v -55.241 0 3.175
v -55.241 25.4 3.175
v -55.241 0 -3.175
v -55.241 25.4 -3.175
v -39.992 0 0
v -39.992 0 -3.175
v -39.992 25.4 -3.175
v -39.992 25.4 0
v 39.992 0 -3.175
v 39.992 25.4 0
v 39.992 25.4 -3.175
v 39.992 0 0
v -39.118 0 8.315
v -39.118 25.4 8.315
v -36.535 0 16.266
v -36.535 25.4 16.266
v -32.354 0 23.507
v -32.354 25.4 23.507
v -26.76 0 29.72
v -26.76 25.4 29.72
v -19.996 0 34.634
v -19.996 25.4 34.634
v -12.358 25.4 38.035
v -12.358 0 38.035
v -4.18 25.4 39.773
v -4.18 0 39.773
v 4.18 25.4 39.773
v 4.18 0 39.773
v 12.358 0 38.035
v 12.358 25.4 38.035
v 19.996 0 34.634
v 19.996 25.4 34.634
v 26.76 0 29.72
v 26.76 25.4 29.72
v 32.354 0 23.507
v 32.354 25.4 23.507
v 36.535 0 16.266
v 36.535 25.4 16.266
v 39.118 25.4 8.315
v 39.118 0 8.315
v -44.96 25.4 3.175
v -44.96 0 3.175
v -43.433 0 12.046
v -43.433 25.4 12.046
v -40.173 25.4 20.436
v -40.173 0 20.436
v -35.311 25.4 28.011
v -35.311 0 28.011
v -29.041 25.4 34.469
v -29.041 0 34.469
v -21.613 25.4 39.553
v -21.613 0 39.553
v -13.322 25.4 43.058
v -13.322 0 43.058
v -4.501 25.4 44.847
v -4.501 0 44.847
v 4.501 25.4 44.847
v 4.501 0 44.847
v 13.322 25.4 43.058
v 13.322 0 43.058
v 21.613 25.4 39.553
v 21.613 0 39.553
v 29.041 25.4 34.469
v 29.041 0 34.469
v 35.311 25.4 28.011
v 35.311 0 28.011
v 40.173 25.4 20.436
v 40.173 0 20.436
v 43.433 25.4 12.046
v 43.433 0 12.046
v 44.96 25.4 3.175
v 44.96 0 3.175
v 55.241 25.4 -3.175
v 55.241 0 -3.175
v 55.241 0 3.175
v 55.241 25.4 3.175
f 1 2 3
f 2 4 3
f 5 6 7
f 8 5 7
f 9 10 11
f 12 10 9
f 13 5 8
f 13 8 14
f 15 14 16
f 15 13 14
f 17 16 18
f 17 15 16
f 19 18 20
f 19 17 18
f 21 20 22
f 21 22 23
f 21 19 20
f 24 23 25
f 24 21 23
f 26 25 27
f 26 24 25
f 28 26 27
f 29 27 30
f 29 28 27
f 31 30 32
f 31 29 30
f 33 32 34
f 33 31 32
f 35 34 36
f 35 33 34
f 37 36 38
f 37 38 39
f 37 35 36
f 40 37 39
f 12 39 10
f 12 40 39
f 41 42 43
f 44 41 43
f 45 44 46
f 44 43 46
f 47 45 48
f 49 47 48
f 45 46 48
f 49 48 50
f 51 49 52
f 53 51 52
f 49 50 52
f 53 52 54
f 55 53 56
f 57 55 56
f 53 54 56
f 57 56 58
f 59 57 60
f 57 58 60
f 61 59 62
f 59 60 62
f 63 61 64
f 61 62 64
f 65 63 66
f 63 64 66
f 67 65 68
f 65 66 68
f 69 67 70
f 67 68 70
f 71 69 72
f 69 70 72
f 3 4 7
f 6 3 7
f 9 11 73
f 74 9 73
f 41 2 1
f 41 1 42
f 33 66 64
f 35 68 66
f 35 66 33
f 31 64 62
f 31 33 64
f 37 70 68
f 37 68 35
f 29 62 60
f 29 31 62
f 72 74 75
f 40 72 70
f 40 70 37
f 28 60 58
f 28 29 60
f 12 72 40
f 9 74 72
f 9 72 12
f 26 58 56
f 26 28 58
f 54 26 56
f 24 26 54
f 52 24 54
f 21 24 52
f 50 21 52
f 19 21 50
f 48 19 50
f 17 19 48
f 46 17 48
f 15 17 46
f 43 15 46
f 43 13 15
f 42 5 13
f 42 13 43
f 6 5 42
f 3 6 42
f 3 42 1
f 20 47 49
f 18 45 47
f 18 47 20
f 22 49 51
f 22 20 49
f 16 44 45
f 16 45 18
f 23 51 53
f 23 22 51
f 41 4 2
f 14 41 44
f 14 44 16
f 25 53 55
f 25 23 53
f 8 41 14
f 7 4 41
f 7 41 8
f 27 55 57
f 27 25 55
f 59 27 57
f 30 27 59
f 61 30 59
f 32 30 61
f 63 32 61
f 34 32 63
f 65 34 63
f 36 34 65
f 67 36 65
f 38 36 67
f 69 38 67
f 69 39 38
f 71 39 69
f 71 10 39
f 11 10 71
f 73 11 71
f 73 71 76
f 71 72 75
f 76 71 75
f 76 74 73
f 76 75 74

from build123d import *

# Parameters (mm, degrees)
SKETCH2_R           = 45.0723
SKETCH2_R_2         = 39.9923
BOSS_EXTRUDE1_DEPTH = 25.4
SKETCH3_W           = 90.1446
SKETCH3_H           = 25.4
CUT_EXTRUDE1_DEPTH  = 46.0723
BOSS_EXTRUDE2_DEPTH = 3.175


with BuildPart() as part:
    # Sketch2 → Boss-Extrude1 (new body)
    with BuildSketch(Plane(origin=(0, 0, 0), x_dir=(1, 0, 0), z_dir=(0, 1, 0))):
        Circle(SKETCH2_R)
        Circle(SKETCH2_R_2, mode=Mode.SUBTRACT)
    extrude(amount=BOSS_EXTRUDE1_DEPTH)

    # Sketch3 → Cut-Extrude1 (cut, through all)
    with BuildSketch(Plane.XY):
        with Locations((0, 12.7)):
            Rectangle(SKETCH3_W, SKETCH3_H)
    extrude(amount=-CUT_EXTRUDE1_DEPTH, mode=Mode.SUBTRACT)

    # Sketch5 → Boss-Extrude2 (add, symmetric)
    with BuildSketch(Plane(origin=(0, 0, 0), x_dir=(-1, 0, 0), z_dir=(0, 0, -1))):
        Polygon((-45.081415665, 25.4), (-39.9923, 25.4), (-39.9923, 0), (-45.167196058, 0), (-55.241415665, 0), (-55.241415665, 25.4), align=None)
        Polygon((45.081415665, 25.4), (55.241415665, 25.4), (55.241415665, 0), (45.167196058, 0), (39.9923, 0), (39.9923, 25.4), align=None)
    extrude(amount=BOSS_EXTRUDE2_DEPTH, both=True)


solid = part.part
